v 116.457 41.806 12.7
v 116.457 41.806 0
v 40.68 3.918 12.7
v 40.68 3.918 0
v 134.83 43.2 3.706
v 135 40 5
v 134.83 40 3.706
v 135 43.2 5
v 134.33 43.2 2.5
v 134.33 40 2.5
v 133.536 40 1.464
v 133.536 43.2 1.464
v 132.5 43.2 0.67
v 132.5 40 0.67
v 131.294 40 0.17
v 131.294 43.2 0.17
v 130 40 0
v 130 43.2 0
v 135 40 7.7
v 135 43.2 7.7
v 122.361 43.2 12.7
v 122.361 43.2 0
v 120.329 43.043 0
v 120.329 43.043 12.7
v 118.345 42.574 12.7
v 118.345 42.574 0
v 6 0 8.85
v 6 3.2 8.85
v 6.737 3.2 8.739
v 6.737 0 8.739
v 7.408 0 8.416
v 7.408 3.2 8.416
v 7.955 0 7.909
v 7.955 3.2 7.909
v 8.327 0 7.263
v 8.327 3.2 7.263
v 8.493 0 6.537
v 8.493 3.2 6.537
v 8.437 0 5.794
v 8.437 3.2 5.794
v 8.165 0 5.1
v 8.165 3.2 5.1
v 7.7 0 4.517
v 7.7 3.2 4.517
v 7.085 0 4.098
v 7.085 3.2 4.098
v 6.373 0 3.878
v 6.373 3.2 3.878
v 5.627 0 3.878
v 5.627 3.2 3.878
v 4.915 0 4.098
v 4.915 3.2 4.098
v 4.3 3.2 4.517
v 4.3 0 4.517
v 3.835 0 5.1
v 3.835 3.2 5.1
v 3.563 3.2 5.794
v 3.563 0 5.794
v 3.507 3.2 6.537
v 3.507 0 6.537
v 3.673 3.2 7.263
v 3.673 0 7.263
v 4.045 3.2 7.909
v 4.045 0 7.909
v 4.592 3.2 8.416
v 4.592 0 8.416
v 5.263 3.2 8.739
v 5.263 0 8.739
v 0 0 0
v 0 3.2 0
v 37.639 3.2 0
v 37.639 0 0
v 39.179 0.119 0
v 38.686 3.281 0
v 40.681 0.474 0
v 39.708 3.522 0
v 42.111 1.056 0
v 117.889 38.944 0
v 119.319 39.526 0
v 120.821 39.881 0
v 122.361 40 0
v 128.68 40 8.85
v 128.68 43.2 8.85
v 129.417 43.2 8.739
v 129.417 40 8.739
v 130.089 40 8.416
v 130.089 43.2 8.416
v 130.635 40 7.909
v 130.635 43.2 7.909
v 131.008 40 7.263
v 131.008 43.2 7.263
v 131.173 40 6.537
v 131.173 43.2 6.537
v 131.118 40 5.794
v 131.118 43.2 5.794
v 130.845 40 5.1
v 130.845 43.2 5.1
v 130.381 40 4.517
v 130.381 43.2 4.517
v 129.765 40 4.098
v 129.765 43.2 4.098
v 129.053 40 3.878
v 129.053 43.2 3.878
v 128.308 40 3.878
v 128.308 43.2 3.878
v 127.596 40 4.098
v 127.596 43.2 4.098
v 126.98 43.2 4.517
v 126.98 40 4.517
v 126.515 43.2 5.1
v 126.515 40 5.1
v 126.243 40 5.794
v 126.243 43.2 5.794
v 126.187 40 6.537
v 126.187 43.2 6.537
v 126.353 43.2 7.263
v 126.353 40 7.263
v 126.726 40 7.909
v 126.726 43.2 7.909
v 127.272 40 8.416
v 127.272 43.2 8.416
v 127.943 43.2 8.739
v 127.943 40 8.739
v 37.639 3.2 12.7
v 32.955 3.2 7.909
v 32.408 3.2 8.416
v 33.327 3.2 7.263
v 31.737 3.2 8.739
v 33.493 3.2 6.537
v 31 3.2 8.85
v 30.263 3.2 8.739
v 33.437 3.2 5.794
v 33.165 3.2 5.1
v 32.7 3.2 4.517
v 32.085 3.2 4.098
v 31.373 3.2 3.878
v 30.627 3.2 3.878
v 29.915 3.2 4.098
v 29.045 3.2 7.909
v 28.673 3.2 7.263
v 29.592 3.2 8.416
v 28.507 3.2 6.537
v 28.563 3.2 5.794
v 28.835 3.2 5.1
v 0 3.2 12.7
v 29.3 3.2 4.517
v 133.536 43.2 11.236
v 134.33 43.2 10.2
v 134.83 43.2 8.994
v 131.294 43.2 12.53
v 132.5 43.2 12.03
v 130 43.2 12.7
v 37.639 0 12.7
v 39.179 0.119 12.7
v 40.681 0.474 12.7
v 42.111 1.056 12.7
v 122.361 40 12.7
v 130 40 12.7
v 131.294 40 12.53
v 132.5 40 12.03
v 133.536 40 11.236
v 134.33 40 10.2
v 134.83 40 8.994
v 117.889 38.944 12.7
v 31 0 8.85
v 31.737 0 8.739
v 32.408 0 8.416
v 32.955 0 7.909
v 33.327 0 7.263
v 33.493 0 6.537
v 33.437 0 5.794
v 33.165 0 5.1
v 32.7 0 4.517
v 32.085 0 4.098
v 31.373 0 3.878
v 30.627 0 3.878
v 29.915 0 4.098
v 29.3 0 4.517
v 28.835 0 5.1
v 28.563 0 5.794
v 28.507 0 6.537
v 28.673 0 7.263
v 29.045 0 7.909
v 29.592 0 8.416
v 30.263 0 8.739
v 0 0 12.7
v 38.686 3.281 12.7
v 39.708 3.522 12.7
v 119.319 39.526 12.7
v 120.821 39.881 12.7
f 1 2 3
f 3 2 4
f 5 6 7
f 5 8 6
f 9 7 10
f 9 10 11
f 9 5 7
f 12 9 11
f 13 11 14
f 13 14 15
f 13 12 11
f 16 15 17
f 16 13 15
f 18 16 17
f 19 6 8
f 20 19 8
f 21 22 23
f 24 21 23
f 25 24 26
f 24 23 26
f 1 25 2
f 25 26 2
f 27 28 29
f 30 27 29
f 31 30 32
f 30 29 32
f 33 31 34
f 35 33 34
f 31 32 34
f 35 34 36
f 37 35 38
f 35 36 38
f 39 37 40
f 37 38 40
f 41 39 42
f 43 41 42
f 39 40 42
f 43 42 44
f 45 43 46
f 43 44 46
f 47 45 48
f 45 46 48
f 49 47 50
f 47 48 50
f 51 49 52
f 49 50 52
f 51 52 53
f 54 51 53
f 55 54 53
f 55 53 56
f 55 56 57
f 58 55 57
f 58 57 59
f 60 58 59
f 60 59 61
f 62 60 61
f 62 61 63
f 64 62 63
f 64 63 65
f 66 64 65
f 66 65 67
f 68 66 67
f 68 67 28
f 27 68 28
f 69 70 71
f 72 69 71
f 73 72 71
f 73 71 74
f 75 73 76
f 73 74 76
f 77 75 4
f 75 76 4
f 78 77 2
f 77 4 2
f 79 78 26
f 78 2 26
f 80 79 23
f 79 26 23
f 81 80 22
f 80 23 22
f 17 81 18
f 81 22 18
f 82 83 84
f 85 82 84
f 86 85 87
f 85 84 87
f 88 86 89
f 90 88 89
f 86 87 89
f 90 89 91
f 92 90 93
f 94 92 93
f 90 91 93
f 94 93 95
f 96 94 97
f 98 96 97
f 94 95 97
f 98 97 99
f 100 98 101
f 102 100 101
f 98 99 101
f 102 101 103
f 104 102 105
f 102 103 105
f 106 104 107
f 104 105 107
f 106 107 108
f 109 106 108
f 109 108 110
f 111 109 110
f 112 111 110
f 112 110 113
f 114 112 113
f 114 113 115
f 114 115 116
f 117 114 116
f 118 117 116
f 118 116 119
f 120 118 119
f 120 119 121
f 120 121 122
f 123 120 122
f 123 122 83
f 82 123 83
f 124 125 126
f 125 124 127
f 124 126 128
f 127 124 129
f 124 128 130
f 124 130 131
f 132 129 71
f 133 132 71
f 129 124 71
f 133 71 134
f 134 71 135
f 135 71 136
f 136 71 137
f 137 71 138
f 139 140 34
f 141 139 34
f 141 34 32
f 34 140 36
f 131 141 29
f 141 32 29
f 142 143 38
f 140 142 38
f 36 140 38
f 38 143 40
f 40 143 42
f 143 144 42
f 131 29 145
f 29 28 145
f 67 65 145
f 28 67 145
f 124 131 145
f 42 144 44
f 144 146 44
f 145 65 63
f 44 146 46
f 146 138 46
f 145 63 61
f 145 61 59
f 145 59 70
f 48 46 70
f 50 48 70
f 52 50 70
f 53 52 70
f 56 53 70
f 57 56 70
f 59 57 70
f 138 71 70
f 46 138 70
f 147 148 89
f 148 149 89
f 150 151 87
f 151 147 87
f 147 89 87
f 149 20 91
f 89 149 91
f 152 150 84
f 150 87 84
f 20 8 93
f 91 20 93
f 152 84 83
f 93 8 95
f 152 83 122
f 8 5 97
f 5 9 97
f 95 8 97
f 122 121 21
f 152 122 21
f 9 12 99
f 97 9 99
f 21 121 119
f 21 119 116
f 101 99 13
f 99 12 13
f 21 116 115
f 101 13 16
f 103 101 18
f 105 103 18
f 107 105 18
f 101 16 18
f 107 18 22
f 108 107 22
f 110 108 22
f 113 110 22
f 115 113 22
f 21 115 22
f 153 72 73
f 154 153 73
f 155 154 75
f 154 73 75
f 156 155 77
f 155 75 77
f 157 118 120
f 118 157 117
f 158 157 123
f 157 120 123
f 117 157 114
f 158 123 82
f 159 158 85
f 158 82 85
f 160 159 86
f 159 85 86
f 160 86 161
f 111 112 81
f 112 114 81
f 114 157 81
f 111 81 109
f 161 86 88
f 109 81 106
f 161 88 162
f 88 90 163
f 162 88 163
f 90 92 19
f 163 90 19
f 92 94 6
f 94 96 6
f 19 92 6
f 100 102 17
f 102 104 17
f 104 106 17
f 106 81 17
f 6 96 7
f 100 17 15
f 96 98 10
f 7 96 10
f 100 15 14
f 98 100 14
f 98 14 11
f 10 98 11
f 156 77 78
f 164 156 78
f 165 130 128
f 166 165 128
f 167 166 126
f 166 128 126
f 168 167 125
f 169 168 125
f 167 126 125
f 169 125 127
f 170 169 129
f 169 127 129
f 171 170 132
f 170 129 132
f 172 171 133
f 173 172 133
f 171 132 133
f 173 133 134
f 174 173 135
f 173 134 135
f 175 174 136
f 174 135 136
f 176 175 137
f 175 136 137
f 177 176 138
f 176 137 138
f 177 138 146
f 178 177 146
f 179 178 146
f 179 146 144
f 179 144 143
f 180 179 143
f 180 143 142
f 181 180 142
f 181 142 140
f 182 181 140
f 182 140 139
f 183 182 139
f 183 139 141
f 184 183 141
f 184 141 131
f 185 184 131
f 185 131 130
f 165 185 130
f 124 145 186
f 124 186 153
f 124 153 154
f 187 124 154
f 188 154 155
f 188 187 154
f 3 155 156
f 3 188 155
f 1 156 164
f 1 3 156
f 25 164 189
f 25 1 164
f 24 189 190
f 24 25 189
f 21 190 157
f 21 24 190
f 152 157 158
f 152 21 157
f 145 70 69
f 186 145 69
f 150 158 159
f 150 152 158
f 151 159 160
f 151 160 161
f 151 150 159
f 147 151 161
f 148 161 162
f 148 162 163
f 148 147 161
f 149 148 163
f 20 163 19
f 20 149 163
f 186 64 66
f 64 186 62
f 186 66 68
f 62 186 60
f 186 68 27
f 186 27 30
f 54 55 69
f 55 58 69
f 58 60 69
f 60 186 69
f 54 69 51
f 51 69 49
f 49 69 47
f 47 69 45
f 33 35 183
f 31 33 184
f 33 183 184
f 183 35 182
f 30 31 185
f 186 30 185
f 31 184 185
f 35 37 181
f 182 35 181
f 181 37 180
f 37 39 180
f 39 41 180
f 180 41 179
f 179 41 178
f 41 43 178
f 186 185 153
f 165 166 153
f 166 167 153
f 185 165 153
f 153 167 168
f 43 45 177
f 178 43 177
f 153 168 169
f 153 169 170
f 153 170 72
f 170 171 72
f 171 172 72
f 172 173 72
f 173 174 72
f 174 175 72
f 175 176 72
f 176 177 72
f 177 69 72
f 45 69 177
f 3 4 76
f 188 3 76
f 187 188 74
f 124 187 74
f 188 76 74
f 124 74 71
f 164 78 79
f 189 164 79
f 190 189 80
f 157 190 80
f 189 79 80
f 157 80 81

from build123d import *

# Parameters (mm, degrees)
RESSALTO_EXTRUS_O1_DEPTH = 12.7
ESBO_O2_R                = 2.5
CORTE_EXTRUS_O1_DEPTH    = 142.372875758
ESBO_O3_R                = 2.5
CORTE_EXTRUS_O2_DEPTH    = 143.311383944
FILETE1_R                = 5
FILETE2_R                = 5


with BuildPart() as part:
    # Esboço1 → Ressalto-extrusão1 (new body)
    with BuildSketch(Plane.XY):
        with BuildLine():
            Line((0, 0), (37.639320225, 0))
            ThreePointArc((37.639320225, 0), (39.93684943, 0.267510105), (42.11145618, 1.05572809))
            Line((42.11145618, 1.05572809), (117.88854382, 38.94427191))
            ThreePointArc((117.88854382, 38.94427191), (120.06315057, 39.732489895), (122.360679775, 40))
            Line((122.360679775, 40), (135, 40))
            Line((135, 40), (135, 43.2))
            Line((135, 43.2), (122.360679775, 43.2))
            ThreePointArc((122.360679775, 43.2), (119.327941224, 42.846886661), (116.457460314, 41.806438921))
            Line((116.457460314, 41.806438921), (40.680372674, 3.917895101))
            ThreePointArc((40.680372674, 3.917895101), (39.201640085, 3.381906872), (37.639320225, 3.2))
            Line((37.639320225, 3.2), (0, 3.2))
            Line((0, 3.2), (0, 0))
        make_face()
    extrude(amount=RESSALTO_EXTRUS_O1_DEPTH)

    # Esboço2 → Corte-extrusão1 (cut, through all)
    with BuildSketch(Plane(origin=(0, 3.2, 0), x_dir=(1, 0, 0), z_dir=(0, 1, 0))):
        with Locations(Location((6, -6.35, 0), (0, 0, 270))):
            Circle(ESBO_O2_R)
        with Locations(Location((31, -6.35, 0), (0, 0, 270))):
            Circle(ESBO_O2_R)
    extrude(amount=-CORTE_EXTRUS_O1_DEPTH, mode=Mode.SUBTRACT)

    # Esboço3 → Corte-extrusão2 (cut, through all)
    with BuildSketch(Plane(origin=(0, 43.2, 0), x_dir=(1, 0, 0), z_dir=(0, 1, 0))):
        with Locations(Location((128.680339887, -6.35, 0), (0, 0, 270))):
            Circle(ESBO_O3_R)
    extrude(amount=-CORTE_EXTRUS_O2_DEPTH, mode=Mode.SUBTRACT)

    # Filete1
    filete1_edges = [part.edges().sort_by_distance(p)[0] for p in [
        (135, 41.6, 12.7),
    ]]
    fillet(filete1_edges, radius=FILETE1_R)

    # Filete2
    filete2_edges = [part.edges().sort_by_distance(p)[0] for p in [
        (135, 41.6, 0),
    ]]
    fillet(filete2_edges, radius=FILETE2_R)


solid = part.part
